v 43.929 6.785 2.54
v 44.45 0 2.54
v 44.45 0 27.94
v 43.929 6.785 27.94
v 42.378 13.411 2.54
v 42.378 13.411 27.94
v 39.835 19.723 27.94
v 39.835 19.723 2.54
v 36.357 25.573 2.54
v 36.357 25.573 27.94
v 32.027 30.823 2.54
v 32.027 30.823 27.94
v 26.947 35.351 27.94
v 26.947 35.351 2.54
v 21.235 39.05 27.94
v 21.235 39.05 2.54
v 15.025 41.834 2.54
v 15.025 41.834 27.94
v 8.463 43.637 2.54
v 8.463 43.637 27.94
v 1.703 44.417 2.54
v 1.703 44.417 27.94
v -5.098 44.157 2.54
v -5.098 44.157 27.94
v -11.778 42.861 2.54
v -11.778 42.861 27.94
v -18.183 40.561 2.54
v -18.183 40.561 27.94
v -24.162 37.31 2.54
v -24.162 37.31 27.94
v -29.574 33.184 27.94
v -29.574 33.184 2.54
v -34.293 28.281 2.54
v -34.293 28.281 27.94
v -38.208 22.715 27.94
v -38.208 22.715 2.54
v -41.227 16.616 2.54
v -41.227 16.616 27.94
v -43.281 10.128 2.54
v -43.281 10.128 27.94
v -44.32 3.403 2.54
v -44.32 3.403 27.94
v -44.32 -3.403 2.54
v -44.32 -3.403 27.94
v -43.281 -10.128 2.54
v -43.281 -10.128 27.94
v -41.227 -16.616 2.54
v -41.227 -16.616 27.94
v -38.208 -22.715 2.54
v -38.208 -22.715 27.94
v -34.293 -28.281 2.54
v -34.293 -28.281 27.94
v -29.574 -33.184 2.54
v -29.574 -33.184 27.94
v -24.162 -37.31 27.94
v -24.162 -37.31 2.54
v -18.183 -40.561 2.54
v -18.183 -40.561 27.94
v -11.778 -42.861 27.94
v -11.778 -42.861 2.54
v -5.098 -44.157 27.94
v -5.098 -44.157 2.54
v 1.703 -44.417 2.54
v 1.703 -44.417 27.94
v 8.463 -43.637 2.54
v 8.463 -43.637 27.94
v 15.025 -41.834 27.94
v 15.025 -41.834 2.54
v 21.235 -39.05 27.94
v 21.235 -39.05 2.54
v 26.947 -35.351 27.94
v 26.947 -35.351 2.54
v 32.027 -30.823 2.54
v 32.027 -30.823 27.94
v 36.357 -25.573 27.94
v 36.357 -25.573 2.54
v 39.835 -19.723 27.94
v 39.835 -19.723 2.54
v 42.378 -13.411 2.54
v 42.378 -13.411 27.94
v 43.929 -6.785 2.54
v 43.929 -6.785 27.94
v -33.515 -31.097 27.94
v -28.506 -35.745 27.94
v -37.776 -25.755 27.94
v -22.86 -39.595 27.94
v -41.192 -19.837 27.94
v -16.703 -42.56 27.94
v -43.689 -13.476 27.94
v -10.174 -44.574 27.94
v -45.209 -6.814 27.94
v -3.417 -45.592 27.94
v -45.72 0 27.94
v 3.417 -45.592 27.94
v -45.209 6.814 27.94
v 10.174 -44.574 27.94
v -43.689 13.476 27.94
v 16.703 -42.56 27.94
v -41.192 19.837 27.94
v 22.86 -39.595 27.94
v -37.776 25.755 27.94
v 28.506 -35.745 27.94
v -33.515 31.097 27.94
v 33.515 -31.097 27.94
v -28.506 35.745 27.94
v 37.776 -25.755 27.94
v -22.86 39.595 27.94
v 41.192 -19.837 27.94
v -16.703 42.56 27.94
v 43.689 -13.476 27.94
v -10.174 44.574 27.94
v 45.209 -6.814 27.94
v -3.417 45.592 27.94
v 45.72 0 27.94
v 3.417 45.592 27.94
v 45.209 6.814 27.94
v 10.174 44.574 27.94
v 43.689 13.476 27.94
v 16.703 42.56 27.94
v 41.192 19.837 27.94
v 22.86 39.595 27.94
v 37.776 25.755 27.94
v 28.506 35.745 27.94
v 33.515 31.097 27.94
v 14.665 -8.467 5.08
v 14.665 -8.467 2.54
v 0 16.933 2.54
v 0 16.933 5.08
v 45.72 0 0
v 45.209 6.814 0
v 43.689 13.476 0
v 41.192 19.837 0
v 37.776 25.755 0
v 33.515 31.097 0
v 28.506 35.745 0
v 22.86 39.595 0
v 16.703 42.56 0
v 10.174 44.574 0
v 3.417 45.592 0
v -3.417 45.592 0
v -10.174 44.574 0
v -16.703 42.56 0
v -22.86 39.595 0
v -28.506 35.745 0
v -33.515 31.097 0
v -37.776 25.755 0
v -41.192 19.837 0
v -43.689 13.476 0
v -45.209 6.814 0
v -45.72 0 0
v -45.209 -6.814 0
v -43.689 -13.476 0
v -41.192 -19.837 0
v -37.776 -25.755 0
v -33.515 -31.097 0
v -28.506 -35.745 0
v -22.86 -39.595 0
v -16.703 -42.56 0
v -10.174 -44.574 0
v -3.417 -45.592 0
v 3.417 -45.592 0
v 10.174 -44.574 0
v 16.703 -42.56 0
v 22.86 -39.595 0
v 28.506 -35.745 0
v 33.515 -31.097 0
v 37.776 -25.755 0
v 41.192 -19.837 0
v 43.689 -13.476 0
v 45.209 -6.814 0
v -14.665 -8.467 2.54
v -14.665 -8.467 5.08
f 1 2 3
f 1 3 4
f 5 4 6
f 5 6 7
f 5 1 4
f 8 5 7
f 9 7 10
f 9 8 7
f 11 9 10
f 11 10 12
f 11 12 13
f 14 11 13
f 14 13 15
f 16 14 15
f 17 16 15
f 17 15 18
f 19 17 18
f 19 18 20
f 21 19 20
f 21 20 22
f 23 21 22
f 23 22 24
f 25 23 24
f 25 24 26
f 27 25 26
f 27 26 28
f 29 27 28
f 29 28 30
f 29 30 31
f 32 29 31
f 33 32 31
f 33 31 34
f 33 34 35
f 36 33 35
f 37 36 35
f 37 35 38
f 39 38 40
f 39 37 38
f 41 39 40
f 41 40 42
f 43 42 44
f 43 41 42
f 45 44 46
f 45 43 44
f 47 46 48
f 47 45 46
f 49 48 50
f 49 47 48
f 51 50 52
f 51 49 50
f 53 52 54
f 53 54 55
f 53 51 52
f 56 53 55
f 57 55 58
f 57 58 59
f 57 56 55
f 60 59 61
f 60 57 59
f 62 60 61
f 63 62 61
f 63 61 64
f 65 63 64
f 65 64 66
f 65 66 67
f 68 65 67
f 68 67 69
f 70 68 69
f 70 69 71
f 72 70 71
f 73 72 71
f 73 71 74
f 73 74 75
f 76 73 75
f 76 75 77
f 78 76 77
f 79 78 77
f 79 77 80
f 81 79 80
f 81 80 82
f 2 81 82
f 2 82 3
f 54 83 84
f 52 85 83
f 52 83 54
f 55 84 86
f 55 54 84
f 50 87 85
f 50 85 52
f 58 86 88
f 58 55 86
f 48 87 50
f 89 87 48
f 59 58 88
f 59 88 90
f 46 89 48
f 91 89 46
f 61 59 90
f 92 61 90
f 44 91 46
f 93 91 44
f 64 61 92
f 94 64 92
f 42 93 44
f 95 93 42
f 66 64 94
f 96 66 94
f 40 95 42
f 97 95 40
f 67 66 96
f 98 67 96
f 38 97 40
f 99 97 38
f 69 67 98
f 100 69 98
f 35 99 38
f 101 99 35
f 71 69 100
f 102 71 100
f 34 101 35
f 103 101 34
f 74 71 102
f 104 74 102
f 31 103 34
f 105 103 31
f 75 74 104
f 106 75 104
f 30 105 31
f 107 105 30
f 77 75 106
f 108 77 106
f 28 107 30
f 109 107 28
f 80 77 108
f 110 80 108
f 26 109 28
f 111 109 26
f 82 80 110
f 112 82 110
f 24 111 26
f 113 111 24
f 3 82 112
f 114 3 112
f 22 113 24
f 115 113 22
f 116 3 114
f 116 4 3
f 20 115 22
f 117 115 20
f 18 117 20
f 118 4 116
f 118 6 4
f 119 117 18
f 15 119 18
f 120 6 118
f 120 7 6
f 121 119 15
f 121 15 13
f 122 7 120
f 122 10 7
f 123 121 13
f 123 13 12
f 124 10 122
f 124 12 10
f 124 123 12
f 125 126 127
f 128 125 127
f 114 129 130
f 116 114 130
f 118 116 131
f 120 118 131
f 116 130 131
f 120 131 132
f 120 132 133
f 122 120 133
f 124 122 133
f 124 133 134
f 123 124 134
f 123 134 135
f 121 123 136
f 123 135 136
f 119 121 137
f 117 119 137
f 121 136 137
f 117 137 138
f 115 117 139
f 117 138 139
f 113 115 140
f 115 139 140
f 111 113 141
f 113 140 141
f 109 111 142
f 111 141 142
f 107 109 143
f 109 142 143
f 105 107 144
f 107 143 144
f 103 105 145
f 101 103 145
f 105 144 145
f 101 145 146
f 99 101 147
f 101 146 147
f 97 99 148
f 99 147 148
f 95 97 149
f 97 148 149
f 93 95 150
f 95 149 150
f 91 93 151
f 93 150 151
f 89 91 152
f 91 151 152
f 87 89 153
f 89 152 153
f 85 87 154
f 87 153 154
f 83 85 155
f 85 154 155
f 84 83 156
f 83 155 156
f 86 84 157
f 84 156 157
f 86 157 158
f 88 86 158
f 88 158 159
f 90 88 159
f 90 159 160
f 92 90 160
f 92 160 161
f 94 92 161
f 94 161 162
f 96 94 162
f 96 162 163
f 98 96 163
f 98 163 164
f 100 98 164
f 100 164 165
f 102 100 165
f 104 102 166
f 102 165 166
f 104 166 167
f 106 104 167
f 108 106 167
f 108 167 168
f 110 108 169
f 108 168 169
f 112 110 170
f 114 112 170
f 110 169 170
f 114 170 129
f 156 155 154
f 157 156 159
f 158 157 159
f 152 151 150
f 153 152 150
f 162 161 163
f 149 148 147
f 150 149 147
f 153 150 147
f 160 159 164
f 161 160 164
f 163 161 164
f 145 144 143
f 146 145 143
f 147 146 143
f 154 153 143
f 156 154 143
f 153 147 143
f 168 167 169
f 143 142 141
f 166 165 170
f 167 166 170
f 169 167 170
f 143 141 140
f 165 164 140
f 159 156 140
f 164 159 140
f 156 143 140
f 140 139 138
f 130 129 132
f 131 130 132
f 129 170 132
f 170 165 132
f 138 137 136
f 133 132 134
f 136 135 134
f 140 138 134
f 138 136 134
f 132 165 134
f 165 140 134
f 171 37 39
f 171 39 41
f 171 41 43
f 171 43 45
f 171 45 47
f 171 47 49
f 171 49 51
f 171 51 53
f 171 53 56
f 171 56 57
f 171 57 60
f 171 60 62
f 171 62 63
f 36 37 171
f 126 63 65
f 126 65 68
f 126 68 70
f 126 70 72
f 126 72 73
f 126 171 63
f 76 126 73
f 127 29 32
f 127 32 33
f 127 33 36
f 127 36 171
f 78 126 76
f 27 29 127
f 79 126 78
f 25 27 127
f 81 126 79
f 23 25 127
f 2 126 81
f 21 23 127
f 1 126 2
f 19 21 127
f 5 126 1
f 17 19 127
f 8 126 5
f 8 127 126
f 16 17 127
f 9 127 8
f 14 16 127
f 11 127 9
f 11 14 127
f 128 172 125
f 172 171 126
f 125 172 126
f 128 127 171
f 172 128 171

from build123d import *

# Parameters (mm, degrees)
F0_R     = 45.72
F0_R_2   = 44.45
F1_DEPTH = 27.94
F2_DEPTH = 2.54
F4_DEPTH = 2.54


with BuildPart() as f1:
    # F0 (on Top) → F1 (new body)
    with BuildSketch(Plane.XY):
        Circle(F0_R)
        Circle(F0_R_2, mode=Mode.SUBTRACT)
    extrude(amount=F1_DEPTH)

    # F0 (on Top) → F2 (join)
    with BuildSketch(Plane.XY):
        Circle(F0_R_2)
    extrude(amount=F2_DEPTH)

    # F3 (on face) → F4 (join)
    with BuildSketch(Plane.XY.offset(2.54)):
        Polygon((-14.664697, -8.466667), (14.664697, -8.466667), (0, 16.933333), align=None)
    extrude(amount=F4_DEPTH)


solid = f1.part
